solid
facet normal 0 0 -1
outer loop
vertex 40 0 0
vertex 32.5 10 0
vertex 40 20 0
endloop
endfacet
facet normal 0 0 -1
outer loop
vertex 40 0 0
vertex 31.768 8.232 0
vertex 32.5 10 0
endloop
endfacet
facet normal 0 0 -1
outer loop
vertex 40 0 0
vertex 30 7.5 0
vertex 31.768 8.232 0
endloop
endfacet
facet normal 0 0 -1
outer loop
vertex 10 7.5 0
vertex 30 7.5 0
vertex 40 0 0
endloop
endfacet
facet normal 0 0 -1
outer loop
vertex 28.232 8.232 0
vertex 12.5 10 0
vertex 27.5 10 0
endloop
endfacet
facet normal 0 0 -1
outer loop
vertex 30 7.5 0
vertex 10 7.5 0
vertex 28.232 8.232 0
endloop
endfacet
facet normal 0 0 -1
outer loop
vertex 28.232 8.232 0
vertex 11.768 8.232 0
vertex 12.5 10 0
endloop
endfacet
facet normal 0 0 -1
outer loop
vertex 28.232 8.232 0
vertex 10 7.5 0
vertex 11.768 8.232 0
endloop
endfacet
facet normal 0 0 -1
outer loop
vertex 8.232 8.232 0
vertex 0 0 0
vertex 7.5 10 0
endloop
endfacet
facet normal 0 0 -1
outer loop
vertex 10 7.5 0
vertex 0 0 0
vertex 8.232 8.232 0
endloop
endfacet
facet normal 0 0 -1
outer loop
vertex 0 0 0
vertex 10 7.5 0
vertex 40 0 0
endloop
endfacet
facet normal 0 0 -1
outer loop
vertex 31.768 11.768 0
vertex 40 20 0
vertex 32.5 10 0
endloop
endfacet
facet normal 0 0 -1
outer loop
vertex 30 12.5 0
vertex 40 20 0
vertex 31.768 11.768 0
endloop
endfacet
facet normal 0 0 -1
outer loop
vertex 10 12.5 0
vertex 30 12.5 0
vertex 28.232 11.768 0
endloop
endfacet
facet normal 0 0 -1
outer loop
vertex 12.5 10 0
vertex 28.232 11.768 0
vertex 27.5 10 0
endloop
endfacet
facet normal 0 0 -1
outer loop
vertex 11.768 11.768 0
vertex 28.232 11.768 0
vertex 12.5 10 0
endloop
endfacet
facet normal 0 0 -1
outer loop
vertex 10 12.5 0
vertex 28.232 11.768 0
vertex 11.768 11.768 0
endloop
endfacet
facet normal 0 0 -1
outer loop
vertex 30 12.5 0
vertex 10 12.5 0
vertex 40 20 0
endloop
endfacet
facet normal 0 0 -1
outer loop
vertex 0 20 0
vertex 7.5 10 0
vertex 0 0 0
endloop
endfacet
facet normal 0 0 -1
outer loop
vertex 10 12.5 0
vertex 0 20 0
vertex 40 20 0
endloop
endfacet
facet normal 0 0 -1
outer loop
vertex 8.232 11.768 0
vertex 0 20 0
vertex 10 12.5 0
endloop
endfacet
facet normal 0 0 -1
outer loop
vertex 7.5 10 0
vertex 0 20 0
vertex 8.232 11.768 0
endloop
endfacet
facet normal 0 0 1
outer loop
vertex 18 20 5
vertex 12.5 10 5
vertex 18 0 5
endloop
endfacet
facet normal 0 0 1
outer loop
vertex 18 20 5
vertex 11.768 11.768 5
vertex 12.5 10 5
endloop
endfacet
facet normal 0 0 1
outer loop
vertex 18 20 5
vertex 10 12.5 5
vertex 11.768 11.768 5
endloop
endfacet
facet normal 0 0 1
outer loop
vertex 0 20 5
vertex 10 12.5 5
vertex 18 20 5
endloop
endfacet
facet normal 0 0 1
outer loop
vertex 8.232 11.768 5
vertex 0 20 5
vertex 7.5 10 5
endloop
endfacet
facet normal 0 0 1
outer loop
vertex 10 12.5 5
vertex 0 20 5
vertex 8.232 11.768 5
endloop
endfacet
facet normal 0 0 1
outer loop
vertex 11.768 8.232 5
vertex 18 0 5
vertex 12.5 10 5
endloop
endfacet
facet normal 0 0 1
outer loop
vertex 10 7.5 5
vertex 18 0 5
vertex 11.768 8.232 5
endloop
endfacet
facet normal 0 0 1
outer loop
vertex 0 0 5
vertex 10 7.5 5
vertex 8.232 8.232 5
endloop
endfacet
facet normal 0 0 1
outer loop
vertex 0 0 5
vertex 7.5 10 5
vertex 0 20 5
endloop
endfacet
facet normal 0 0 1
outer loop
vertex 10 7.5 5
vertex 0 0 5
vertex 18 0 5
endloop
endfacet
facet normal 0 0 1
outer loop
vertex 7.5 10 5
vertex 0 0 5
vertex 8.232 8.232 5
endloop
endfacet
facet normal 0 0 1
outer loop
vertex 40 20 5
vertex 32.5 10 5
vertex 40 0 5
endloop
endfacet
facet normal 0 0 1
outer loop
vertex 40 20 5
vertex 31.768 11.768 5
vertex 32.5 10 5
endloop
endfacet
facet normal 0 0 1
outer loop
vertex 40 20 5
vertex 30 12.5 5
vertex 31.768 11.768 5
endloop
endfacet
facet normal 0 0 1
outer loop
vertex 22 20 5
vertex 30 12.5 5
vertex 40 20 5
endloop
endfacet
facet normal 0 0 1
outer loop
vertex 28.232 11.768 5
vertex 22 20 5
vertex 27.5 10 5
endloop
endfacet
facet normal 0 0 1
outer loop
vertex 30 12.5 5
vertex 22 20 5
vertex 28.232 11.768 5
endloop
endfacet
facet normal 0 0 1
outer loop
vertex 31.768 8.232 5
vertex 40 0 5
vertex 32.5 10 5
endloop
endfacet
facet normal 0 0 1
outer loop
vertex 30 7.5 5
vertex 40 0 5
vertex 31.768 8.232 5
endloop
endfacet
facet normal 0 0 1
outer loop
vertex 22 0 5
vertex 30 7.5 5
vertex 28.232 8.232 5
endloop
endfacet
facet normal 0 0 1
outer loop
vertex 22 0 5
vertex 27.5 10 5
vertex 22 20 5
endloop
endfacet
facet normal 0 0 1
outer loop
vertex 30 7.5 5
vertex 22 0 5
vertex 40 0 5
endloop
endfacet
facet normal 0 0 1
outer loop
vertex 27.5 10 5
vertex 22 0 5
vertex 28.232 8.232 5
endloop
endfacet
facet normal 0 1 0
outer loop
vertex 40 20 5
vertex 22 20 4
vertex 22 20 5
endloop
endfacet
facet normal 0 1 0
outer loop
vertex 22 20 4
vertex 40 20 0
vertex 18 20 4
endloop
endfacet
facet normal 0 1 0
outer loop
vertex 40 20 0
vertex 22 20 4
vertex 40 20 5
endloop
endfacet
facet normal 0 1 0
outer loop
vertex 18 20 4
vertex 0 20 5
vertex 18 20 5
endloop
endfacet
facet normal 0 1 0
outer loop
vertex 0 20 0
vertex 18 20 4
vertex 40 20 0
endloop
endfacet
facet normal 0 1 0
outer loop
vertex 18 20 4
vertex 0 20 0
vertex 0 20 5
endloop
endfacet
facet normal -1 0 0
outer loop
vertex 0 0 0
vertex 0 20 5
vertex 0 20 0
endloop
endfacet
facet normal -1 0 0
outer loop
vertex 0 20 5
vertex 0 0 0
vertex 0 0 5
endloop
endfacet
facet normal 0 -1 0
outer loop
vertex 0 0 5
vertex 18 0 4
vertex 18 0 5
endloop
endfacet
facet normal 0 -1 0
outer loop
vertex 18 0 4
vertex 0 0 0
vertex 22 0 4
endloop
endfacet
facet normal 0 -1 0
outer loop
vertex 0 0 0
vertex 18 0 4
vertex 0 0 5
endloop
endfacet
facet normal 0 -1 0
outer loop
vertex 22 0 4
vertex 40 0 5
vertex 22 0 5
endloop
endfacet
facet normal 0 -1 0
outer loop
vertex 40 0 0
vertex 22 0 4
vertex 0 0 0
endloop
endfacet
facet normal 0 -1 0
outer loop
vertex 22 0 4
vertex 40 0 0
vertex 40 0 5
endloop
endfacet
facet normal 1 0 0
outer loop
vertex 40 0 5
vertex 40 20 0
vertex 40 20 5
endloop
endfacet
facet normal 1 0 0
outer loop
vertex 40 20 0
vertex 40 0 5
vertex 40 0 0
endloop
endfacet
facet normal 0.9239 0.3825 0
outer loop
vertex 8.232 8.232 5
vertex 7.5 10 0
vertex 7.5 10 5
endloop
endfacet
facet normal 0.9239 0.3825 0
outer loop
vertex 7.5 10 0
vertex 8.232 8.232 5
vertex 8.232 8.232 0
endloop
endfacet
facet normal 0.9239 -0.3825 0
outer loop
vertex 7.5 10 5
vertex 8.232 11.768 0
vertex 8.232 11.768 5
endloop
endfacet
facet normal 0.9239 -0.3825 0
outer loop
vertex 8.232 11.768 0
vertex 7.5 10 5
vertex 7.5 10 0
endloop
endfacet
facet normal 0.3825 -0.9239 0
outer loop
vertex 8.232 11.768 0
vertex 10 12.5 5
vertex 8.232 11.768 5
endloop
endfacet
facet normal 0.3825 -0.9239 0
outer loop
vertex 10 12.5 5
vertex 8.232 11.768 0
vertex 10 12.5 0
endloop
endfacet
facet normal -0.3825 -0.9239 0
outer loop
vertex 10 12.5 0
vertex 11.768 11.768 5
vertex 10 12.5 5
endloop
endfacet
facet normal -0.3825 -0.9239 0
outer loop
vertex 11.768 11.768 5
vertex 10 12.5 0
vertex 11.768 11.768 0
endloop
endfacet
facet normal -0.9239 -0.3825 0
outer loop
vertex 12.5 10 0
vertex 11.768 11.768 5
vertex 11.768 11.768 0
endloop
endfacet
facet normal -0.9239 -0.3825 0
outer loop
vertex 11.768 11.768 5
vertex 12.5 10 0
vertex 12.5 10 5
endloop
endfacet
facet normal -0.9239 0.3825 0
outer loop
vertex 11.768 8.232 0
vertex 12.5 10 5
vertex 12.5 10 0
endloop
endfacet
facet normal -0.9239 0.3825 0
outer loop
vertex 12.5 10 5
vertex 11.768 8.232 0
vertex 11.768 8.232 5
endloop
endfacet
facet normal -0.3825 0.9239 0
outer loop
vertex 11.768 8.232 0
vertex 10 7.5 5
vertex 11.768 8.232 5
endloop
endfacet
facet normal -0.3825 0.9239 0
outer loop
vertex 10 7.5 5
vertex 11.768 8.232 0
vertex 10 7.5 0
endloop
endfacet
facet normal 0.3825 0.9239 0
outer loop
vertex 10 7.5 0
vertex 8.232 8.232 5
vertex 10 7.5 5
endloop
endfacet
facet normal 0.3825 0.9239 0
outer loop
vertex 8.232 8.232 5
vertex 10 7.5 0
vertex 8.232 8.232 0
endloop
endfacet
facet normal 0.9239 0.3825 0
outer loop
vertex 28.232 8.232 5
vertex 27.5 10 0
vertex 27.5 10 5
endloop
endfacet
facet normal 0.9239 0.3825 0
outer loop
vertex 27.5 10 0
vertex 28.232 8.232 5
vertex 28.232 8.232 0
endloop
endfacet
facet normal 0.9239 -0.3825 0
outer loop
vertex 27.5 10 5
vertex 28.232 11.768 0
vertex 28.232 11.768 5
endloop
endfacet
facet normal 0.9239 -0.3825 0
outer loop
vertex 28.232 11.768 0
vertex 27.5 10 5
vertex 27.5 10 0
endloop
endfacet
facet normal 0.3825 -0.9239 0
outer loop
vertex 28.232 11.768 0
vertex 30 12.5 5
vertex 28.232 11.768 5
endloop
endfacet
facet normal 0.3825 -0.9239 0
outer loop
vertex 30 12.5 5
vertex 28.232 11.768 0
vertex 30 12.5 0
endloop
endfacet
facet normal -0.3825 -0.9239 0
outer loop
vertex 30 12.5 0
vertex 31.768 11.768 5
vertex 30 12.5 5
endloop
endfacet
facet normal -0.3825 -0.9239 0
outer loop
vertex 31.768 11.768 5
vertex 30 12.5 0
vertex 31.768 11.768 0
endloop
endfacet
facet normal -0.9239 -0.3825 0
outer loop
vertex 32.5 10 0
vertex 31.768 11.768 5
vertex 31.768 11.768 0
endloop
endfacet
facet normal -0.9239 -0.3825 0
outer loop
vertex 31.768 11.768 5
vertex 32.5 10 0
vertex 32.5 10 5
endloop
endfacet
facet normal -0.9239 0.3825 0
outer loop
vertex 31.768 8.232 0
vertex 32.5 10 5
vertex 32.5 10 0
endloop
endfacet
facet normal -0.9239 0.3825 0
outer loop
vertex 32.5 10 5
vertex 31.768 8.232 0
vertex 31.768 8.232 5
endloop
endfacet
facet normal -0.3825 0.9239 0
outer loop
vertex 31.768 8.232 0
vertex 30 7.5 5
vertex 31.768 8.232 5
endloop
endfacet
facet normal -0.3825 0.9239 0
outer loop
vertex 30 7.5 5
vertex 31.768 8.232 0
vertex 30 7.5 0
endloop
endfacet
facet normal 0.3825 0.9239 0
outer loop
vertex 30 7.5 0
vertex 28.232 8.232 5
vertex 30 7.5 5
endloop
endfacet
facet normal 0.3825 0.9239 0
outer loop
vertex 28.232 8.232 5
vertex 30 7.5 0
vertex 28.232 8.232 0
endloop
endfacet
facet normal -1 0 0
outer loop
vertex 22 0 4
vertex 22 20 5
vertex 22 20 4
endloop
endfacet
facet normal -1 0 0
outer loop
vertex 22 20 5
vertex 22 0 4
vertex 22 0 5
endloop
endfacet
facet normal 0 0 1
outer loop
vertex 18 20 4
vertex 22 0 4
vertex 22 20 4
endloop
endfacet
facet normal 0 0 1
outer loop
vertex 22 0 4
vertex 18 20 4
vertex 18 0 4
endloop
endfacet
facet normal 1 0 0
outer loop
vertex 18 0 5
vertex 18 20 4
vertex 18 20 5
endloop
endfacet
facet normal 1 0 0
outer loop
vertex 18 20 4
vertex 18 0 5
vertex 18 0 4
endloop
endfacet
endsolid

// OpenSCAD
difference() {
    linear_extrude(5)
        difference() {
            square([40, 20]);
            translate ([10, 10]) circle(d=5);
            translate ([30, 10]) circle(d=5);
            
        };
    translate ([18, 0, 4]) cube( [ 4, 20, 2]);
}
